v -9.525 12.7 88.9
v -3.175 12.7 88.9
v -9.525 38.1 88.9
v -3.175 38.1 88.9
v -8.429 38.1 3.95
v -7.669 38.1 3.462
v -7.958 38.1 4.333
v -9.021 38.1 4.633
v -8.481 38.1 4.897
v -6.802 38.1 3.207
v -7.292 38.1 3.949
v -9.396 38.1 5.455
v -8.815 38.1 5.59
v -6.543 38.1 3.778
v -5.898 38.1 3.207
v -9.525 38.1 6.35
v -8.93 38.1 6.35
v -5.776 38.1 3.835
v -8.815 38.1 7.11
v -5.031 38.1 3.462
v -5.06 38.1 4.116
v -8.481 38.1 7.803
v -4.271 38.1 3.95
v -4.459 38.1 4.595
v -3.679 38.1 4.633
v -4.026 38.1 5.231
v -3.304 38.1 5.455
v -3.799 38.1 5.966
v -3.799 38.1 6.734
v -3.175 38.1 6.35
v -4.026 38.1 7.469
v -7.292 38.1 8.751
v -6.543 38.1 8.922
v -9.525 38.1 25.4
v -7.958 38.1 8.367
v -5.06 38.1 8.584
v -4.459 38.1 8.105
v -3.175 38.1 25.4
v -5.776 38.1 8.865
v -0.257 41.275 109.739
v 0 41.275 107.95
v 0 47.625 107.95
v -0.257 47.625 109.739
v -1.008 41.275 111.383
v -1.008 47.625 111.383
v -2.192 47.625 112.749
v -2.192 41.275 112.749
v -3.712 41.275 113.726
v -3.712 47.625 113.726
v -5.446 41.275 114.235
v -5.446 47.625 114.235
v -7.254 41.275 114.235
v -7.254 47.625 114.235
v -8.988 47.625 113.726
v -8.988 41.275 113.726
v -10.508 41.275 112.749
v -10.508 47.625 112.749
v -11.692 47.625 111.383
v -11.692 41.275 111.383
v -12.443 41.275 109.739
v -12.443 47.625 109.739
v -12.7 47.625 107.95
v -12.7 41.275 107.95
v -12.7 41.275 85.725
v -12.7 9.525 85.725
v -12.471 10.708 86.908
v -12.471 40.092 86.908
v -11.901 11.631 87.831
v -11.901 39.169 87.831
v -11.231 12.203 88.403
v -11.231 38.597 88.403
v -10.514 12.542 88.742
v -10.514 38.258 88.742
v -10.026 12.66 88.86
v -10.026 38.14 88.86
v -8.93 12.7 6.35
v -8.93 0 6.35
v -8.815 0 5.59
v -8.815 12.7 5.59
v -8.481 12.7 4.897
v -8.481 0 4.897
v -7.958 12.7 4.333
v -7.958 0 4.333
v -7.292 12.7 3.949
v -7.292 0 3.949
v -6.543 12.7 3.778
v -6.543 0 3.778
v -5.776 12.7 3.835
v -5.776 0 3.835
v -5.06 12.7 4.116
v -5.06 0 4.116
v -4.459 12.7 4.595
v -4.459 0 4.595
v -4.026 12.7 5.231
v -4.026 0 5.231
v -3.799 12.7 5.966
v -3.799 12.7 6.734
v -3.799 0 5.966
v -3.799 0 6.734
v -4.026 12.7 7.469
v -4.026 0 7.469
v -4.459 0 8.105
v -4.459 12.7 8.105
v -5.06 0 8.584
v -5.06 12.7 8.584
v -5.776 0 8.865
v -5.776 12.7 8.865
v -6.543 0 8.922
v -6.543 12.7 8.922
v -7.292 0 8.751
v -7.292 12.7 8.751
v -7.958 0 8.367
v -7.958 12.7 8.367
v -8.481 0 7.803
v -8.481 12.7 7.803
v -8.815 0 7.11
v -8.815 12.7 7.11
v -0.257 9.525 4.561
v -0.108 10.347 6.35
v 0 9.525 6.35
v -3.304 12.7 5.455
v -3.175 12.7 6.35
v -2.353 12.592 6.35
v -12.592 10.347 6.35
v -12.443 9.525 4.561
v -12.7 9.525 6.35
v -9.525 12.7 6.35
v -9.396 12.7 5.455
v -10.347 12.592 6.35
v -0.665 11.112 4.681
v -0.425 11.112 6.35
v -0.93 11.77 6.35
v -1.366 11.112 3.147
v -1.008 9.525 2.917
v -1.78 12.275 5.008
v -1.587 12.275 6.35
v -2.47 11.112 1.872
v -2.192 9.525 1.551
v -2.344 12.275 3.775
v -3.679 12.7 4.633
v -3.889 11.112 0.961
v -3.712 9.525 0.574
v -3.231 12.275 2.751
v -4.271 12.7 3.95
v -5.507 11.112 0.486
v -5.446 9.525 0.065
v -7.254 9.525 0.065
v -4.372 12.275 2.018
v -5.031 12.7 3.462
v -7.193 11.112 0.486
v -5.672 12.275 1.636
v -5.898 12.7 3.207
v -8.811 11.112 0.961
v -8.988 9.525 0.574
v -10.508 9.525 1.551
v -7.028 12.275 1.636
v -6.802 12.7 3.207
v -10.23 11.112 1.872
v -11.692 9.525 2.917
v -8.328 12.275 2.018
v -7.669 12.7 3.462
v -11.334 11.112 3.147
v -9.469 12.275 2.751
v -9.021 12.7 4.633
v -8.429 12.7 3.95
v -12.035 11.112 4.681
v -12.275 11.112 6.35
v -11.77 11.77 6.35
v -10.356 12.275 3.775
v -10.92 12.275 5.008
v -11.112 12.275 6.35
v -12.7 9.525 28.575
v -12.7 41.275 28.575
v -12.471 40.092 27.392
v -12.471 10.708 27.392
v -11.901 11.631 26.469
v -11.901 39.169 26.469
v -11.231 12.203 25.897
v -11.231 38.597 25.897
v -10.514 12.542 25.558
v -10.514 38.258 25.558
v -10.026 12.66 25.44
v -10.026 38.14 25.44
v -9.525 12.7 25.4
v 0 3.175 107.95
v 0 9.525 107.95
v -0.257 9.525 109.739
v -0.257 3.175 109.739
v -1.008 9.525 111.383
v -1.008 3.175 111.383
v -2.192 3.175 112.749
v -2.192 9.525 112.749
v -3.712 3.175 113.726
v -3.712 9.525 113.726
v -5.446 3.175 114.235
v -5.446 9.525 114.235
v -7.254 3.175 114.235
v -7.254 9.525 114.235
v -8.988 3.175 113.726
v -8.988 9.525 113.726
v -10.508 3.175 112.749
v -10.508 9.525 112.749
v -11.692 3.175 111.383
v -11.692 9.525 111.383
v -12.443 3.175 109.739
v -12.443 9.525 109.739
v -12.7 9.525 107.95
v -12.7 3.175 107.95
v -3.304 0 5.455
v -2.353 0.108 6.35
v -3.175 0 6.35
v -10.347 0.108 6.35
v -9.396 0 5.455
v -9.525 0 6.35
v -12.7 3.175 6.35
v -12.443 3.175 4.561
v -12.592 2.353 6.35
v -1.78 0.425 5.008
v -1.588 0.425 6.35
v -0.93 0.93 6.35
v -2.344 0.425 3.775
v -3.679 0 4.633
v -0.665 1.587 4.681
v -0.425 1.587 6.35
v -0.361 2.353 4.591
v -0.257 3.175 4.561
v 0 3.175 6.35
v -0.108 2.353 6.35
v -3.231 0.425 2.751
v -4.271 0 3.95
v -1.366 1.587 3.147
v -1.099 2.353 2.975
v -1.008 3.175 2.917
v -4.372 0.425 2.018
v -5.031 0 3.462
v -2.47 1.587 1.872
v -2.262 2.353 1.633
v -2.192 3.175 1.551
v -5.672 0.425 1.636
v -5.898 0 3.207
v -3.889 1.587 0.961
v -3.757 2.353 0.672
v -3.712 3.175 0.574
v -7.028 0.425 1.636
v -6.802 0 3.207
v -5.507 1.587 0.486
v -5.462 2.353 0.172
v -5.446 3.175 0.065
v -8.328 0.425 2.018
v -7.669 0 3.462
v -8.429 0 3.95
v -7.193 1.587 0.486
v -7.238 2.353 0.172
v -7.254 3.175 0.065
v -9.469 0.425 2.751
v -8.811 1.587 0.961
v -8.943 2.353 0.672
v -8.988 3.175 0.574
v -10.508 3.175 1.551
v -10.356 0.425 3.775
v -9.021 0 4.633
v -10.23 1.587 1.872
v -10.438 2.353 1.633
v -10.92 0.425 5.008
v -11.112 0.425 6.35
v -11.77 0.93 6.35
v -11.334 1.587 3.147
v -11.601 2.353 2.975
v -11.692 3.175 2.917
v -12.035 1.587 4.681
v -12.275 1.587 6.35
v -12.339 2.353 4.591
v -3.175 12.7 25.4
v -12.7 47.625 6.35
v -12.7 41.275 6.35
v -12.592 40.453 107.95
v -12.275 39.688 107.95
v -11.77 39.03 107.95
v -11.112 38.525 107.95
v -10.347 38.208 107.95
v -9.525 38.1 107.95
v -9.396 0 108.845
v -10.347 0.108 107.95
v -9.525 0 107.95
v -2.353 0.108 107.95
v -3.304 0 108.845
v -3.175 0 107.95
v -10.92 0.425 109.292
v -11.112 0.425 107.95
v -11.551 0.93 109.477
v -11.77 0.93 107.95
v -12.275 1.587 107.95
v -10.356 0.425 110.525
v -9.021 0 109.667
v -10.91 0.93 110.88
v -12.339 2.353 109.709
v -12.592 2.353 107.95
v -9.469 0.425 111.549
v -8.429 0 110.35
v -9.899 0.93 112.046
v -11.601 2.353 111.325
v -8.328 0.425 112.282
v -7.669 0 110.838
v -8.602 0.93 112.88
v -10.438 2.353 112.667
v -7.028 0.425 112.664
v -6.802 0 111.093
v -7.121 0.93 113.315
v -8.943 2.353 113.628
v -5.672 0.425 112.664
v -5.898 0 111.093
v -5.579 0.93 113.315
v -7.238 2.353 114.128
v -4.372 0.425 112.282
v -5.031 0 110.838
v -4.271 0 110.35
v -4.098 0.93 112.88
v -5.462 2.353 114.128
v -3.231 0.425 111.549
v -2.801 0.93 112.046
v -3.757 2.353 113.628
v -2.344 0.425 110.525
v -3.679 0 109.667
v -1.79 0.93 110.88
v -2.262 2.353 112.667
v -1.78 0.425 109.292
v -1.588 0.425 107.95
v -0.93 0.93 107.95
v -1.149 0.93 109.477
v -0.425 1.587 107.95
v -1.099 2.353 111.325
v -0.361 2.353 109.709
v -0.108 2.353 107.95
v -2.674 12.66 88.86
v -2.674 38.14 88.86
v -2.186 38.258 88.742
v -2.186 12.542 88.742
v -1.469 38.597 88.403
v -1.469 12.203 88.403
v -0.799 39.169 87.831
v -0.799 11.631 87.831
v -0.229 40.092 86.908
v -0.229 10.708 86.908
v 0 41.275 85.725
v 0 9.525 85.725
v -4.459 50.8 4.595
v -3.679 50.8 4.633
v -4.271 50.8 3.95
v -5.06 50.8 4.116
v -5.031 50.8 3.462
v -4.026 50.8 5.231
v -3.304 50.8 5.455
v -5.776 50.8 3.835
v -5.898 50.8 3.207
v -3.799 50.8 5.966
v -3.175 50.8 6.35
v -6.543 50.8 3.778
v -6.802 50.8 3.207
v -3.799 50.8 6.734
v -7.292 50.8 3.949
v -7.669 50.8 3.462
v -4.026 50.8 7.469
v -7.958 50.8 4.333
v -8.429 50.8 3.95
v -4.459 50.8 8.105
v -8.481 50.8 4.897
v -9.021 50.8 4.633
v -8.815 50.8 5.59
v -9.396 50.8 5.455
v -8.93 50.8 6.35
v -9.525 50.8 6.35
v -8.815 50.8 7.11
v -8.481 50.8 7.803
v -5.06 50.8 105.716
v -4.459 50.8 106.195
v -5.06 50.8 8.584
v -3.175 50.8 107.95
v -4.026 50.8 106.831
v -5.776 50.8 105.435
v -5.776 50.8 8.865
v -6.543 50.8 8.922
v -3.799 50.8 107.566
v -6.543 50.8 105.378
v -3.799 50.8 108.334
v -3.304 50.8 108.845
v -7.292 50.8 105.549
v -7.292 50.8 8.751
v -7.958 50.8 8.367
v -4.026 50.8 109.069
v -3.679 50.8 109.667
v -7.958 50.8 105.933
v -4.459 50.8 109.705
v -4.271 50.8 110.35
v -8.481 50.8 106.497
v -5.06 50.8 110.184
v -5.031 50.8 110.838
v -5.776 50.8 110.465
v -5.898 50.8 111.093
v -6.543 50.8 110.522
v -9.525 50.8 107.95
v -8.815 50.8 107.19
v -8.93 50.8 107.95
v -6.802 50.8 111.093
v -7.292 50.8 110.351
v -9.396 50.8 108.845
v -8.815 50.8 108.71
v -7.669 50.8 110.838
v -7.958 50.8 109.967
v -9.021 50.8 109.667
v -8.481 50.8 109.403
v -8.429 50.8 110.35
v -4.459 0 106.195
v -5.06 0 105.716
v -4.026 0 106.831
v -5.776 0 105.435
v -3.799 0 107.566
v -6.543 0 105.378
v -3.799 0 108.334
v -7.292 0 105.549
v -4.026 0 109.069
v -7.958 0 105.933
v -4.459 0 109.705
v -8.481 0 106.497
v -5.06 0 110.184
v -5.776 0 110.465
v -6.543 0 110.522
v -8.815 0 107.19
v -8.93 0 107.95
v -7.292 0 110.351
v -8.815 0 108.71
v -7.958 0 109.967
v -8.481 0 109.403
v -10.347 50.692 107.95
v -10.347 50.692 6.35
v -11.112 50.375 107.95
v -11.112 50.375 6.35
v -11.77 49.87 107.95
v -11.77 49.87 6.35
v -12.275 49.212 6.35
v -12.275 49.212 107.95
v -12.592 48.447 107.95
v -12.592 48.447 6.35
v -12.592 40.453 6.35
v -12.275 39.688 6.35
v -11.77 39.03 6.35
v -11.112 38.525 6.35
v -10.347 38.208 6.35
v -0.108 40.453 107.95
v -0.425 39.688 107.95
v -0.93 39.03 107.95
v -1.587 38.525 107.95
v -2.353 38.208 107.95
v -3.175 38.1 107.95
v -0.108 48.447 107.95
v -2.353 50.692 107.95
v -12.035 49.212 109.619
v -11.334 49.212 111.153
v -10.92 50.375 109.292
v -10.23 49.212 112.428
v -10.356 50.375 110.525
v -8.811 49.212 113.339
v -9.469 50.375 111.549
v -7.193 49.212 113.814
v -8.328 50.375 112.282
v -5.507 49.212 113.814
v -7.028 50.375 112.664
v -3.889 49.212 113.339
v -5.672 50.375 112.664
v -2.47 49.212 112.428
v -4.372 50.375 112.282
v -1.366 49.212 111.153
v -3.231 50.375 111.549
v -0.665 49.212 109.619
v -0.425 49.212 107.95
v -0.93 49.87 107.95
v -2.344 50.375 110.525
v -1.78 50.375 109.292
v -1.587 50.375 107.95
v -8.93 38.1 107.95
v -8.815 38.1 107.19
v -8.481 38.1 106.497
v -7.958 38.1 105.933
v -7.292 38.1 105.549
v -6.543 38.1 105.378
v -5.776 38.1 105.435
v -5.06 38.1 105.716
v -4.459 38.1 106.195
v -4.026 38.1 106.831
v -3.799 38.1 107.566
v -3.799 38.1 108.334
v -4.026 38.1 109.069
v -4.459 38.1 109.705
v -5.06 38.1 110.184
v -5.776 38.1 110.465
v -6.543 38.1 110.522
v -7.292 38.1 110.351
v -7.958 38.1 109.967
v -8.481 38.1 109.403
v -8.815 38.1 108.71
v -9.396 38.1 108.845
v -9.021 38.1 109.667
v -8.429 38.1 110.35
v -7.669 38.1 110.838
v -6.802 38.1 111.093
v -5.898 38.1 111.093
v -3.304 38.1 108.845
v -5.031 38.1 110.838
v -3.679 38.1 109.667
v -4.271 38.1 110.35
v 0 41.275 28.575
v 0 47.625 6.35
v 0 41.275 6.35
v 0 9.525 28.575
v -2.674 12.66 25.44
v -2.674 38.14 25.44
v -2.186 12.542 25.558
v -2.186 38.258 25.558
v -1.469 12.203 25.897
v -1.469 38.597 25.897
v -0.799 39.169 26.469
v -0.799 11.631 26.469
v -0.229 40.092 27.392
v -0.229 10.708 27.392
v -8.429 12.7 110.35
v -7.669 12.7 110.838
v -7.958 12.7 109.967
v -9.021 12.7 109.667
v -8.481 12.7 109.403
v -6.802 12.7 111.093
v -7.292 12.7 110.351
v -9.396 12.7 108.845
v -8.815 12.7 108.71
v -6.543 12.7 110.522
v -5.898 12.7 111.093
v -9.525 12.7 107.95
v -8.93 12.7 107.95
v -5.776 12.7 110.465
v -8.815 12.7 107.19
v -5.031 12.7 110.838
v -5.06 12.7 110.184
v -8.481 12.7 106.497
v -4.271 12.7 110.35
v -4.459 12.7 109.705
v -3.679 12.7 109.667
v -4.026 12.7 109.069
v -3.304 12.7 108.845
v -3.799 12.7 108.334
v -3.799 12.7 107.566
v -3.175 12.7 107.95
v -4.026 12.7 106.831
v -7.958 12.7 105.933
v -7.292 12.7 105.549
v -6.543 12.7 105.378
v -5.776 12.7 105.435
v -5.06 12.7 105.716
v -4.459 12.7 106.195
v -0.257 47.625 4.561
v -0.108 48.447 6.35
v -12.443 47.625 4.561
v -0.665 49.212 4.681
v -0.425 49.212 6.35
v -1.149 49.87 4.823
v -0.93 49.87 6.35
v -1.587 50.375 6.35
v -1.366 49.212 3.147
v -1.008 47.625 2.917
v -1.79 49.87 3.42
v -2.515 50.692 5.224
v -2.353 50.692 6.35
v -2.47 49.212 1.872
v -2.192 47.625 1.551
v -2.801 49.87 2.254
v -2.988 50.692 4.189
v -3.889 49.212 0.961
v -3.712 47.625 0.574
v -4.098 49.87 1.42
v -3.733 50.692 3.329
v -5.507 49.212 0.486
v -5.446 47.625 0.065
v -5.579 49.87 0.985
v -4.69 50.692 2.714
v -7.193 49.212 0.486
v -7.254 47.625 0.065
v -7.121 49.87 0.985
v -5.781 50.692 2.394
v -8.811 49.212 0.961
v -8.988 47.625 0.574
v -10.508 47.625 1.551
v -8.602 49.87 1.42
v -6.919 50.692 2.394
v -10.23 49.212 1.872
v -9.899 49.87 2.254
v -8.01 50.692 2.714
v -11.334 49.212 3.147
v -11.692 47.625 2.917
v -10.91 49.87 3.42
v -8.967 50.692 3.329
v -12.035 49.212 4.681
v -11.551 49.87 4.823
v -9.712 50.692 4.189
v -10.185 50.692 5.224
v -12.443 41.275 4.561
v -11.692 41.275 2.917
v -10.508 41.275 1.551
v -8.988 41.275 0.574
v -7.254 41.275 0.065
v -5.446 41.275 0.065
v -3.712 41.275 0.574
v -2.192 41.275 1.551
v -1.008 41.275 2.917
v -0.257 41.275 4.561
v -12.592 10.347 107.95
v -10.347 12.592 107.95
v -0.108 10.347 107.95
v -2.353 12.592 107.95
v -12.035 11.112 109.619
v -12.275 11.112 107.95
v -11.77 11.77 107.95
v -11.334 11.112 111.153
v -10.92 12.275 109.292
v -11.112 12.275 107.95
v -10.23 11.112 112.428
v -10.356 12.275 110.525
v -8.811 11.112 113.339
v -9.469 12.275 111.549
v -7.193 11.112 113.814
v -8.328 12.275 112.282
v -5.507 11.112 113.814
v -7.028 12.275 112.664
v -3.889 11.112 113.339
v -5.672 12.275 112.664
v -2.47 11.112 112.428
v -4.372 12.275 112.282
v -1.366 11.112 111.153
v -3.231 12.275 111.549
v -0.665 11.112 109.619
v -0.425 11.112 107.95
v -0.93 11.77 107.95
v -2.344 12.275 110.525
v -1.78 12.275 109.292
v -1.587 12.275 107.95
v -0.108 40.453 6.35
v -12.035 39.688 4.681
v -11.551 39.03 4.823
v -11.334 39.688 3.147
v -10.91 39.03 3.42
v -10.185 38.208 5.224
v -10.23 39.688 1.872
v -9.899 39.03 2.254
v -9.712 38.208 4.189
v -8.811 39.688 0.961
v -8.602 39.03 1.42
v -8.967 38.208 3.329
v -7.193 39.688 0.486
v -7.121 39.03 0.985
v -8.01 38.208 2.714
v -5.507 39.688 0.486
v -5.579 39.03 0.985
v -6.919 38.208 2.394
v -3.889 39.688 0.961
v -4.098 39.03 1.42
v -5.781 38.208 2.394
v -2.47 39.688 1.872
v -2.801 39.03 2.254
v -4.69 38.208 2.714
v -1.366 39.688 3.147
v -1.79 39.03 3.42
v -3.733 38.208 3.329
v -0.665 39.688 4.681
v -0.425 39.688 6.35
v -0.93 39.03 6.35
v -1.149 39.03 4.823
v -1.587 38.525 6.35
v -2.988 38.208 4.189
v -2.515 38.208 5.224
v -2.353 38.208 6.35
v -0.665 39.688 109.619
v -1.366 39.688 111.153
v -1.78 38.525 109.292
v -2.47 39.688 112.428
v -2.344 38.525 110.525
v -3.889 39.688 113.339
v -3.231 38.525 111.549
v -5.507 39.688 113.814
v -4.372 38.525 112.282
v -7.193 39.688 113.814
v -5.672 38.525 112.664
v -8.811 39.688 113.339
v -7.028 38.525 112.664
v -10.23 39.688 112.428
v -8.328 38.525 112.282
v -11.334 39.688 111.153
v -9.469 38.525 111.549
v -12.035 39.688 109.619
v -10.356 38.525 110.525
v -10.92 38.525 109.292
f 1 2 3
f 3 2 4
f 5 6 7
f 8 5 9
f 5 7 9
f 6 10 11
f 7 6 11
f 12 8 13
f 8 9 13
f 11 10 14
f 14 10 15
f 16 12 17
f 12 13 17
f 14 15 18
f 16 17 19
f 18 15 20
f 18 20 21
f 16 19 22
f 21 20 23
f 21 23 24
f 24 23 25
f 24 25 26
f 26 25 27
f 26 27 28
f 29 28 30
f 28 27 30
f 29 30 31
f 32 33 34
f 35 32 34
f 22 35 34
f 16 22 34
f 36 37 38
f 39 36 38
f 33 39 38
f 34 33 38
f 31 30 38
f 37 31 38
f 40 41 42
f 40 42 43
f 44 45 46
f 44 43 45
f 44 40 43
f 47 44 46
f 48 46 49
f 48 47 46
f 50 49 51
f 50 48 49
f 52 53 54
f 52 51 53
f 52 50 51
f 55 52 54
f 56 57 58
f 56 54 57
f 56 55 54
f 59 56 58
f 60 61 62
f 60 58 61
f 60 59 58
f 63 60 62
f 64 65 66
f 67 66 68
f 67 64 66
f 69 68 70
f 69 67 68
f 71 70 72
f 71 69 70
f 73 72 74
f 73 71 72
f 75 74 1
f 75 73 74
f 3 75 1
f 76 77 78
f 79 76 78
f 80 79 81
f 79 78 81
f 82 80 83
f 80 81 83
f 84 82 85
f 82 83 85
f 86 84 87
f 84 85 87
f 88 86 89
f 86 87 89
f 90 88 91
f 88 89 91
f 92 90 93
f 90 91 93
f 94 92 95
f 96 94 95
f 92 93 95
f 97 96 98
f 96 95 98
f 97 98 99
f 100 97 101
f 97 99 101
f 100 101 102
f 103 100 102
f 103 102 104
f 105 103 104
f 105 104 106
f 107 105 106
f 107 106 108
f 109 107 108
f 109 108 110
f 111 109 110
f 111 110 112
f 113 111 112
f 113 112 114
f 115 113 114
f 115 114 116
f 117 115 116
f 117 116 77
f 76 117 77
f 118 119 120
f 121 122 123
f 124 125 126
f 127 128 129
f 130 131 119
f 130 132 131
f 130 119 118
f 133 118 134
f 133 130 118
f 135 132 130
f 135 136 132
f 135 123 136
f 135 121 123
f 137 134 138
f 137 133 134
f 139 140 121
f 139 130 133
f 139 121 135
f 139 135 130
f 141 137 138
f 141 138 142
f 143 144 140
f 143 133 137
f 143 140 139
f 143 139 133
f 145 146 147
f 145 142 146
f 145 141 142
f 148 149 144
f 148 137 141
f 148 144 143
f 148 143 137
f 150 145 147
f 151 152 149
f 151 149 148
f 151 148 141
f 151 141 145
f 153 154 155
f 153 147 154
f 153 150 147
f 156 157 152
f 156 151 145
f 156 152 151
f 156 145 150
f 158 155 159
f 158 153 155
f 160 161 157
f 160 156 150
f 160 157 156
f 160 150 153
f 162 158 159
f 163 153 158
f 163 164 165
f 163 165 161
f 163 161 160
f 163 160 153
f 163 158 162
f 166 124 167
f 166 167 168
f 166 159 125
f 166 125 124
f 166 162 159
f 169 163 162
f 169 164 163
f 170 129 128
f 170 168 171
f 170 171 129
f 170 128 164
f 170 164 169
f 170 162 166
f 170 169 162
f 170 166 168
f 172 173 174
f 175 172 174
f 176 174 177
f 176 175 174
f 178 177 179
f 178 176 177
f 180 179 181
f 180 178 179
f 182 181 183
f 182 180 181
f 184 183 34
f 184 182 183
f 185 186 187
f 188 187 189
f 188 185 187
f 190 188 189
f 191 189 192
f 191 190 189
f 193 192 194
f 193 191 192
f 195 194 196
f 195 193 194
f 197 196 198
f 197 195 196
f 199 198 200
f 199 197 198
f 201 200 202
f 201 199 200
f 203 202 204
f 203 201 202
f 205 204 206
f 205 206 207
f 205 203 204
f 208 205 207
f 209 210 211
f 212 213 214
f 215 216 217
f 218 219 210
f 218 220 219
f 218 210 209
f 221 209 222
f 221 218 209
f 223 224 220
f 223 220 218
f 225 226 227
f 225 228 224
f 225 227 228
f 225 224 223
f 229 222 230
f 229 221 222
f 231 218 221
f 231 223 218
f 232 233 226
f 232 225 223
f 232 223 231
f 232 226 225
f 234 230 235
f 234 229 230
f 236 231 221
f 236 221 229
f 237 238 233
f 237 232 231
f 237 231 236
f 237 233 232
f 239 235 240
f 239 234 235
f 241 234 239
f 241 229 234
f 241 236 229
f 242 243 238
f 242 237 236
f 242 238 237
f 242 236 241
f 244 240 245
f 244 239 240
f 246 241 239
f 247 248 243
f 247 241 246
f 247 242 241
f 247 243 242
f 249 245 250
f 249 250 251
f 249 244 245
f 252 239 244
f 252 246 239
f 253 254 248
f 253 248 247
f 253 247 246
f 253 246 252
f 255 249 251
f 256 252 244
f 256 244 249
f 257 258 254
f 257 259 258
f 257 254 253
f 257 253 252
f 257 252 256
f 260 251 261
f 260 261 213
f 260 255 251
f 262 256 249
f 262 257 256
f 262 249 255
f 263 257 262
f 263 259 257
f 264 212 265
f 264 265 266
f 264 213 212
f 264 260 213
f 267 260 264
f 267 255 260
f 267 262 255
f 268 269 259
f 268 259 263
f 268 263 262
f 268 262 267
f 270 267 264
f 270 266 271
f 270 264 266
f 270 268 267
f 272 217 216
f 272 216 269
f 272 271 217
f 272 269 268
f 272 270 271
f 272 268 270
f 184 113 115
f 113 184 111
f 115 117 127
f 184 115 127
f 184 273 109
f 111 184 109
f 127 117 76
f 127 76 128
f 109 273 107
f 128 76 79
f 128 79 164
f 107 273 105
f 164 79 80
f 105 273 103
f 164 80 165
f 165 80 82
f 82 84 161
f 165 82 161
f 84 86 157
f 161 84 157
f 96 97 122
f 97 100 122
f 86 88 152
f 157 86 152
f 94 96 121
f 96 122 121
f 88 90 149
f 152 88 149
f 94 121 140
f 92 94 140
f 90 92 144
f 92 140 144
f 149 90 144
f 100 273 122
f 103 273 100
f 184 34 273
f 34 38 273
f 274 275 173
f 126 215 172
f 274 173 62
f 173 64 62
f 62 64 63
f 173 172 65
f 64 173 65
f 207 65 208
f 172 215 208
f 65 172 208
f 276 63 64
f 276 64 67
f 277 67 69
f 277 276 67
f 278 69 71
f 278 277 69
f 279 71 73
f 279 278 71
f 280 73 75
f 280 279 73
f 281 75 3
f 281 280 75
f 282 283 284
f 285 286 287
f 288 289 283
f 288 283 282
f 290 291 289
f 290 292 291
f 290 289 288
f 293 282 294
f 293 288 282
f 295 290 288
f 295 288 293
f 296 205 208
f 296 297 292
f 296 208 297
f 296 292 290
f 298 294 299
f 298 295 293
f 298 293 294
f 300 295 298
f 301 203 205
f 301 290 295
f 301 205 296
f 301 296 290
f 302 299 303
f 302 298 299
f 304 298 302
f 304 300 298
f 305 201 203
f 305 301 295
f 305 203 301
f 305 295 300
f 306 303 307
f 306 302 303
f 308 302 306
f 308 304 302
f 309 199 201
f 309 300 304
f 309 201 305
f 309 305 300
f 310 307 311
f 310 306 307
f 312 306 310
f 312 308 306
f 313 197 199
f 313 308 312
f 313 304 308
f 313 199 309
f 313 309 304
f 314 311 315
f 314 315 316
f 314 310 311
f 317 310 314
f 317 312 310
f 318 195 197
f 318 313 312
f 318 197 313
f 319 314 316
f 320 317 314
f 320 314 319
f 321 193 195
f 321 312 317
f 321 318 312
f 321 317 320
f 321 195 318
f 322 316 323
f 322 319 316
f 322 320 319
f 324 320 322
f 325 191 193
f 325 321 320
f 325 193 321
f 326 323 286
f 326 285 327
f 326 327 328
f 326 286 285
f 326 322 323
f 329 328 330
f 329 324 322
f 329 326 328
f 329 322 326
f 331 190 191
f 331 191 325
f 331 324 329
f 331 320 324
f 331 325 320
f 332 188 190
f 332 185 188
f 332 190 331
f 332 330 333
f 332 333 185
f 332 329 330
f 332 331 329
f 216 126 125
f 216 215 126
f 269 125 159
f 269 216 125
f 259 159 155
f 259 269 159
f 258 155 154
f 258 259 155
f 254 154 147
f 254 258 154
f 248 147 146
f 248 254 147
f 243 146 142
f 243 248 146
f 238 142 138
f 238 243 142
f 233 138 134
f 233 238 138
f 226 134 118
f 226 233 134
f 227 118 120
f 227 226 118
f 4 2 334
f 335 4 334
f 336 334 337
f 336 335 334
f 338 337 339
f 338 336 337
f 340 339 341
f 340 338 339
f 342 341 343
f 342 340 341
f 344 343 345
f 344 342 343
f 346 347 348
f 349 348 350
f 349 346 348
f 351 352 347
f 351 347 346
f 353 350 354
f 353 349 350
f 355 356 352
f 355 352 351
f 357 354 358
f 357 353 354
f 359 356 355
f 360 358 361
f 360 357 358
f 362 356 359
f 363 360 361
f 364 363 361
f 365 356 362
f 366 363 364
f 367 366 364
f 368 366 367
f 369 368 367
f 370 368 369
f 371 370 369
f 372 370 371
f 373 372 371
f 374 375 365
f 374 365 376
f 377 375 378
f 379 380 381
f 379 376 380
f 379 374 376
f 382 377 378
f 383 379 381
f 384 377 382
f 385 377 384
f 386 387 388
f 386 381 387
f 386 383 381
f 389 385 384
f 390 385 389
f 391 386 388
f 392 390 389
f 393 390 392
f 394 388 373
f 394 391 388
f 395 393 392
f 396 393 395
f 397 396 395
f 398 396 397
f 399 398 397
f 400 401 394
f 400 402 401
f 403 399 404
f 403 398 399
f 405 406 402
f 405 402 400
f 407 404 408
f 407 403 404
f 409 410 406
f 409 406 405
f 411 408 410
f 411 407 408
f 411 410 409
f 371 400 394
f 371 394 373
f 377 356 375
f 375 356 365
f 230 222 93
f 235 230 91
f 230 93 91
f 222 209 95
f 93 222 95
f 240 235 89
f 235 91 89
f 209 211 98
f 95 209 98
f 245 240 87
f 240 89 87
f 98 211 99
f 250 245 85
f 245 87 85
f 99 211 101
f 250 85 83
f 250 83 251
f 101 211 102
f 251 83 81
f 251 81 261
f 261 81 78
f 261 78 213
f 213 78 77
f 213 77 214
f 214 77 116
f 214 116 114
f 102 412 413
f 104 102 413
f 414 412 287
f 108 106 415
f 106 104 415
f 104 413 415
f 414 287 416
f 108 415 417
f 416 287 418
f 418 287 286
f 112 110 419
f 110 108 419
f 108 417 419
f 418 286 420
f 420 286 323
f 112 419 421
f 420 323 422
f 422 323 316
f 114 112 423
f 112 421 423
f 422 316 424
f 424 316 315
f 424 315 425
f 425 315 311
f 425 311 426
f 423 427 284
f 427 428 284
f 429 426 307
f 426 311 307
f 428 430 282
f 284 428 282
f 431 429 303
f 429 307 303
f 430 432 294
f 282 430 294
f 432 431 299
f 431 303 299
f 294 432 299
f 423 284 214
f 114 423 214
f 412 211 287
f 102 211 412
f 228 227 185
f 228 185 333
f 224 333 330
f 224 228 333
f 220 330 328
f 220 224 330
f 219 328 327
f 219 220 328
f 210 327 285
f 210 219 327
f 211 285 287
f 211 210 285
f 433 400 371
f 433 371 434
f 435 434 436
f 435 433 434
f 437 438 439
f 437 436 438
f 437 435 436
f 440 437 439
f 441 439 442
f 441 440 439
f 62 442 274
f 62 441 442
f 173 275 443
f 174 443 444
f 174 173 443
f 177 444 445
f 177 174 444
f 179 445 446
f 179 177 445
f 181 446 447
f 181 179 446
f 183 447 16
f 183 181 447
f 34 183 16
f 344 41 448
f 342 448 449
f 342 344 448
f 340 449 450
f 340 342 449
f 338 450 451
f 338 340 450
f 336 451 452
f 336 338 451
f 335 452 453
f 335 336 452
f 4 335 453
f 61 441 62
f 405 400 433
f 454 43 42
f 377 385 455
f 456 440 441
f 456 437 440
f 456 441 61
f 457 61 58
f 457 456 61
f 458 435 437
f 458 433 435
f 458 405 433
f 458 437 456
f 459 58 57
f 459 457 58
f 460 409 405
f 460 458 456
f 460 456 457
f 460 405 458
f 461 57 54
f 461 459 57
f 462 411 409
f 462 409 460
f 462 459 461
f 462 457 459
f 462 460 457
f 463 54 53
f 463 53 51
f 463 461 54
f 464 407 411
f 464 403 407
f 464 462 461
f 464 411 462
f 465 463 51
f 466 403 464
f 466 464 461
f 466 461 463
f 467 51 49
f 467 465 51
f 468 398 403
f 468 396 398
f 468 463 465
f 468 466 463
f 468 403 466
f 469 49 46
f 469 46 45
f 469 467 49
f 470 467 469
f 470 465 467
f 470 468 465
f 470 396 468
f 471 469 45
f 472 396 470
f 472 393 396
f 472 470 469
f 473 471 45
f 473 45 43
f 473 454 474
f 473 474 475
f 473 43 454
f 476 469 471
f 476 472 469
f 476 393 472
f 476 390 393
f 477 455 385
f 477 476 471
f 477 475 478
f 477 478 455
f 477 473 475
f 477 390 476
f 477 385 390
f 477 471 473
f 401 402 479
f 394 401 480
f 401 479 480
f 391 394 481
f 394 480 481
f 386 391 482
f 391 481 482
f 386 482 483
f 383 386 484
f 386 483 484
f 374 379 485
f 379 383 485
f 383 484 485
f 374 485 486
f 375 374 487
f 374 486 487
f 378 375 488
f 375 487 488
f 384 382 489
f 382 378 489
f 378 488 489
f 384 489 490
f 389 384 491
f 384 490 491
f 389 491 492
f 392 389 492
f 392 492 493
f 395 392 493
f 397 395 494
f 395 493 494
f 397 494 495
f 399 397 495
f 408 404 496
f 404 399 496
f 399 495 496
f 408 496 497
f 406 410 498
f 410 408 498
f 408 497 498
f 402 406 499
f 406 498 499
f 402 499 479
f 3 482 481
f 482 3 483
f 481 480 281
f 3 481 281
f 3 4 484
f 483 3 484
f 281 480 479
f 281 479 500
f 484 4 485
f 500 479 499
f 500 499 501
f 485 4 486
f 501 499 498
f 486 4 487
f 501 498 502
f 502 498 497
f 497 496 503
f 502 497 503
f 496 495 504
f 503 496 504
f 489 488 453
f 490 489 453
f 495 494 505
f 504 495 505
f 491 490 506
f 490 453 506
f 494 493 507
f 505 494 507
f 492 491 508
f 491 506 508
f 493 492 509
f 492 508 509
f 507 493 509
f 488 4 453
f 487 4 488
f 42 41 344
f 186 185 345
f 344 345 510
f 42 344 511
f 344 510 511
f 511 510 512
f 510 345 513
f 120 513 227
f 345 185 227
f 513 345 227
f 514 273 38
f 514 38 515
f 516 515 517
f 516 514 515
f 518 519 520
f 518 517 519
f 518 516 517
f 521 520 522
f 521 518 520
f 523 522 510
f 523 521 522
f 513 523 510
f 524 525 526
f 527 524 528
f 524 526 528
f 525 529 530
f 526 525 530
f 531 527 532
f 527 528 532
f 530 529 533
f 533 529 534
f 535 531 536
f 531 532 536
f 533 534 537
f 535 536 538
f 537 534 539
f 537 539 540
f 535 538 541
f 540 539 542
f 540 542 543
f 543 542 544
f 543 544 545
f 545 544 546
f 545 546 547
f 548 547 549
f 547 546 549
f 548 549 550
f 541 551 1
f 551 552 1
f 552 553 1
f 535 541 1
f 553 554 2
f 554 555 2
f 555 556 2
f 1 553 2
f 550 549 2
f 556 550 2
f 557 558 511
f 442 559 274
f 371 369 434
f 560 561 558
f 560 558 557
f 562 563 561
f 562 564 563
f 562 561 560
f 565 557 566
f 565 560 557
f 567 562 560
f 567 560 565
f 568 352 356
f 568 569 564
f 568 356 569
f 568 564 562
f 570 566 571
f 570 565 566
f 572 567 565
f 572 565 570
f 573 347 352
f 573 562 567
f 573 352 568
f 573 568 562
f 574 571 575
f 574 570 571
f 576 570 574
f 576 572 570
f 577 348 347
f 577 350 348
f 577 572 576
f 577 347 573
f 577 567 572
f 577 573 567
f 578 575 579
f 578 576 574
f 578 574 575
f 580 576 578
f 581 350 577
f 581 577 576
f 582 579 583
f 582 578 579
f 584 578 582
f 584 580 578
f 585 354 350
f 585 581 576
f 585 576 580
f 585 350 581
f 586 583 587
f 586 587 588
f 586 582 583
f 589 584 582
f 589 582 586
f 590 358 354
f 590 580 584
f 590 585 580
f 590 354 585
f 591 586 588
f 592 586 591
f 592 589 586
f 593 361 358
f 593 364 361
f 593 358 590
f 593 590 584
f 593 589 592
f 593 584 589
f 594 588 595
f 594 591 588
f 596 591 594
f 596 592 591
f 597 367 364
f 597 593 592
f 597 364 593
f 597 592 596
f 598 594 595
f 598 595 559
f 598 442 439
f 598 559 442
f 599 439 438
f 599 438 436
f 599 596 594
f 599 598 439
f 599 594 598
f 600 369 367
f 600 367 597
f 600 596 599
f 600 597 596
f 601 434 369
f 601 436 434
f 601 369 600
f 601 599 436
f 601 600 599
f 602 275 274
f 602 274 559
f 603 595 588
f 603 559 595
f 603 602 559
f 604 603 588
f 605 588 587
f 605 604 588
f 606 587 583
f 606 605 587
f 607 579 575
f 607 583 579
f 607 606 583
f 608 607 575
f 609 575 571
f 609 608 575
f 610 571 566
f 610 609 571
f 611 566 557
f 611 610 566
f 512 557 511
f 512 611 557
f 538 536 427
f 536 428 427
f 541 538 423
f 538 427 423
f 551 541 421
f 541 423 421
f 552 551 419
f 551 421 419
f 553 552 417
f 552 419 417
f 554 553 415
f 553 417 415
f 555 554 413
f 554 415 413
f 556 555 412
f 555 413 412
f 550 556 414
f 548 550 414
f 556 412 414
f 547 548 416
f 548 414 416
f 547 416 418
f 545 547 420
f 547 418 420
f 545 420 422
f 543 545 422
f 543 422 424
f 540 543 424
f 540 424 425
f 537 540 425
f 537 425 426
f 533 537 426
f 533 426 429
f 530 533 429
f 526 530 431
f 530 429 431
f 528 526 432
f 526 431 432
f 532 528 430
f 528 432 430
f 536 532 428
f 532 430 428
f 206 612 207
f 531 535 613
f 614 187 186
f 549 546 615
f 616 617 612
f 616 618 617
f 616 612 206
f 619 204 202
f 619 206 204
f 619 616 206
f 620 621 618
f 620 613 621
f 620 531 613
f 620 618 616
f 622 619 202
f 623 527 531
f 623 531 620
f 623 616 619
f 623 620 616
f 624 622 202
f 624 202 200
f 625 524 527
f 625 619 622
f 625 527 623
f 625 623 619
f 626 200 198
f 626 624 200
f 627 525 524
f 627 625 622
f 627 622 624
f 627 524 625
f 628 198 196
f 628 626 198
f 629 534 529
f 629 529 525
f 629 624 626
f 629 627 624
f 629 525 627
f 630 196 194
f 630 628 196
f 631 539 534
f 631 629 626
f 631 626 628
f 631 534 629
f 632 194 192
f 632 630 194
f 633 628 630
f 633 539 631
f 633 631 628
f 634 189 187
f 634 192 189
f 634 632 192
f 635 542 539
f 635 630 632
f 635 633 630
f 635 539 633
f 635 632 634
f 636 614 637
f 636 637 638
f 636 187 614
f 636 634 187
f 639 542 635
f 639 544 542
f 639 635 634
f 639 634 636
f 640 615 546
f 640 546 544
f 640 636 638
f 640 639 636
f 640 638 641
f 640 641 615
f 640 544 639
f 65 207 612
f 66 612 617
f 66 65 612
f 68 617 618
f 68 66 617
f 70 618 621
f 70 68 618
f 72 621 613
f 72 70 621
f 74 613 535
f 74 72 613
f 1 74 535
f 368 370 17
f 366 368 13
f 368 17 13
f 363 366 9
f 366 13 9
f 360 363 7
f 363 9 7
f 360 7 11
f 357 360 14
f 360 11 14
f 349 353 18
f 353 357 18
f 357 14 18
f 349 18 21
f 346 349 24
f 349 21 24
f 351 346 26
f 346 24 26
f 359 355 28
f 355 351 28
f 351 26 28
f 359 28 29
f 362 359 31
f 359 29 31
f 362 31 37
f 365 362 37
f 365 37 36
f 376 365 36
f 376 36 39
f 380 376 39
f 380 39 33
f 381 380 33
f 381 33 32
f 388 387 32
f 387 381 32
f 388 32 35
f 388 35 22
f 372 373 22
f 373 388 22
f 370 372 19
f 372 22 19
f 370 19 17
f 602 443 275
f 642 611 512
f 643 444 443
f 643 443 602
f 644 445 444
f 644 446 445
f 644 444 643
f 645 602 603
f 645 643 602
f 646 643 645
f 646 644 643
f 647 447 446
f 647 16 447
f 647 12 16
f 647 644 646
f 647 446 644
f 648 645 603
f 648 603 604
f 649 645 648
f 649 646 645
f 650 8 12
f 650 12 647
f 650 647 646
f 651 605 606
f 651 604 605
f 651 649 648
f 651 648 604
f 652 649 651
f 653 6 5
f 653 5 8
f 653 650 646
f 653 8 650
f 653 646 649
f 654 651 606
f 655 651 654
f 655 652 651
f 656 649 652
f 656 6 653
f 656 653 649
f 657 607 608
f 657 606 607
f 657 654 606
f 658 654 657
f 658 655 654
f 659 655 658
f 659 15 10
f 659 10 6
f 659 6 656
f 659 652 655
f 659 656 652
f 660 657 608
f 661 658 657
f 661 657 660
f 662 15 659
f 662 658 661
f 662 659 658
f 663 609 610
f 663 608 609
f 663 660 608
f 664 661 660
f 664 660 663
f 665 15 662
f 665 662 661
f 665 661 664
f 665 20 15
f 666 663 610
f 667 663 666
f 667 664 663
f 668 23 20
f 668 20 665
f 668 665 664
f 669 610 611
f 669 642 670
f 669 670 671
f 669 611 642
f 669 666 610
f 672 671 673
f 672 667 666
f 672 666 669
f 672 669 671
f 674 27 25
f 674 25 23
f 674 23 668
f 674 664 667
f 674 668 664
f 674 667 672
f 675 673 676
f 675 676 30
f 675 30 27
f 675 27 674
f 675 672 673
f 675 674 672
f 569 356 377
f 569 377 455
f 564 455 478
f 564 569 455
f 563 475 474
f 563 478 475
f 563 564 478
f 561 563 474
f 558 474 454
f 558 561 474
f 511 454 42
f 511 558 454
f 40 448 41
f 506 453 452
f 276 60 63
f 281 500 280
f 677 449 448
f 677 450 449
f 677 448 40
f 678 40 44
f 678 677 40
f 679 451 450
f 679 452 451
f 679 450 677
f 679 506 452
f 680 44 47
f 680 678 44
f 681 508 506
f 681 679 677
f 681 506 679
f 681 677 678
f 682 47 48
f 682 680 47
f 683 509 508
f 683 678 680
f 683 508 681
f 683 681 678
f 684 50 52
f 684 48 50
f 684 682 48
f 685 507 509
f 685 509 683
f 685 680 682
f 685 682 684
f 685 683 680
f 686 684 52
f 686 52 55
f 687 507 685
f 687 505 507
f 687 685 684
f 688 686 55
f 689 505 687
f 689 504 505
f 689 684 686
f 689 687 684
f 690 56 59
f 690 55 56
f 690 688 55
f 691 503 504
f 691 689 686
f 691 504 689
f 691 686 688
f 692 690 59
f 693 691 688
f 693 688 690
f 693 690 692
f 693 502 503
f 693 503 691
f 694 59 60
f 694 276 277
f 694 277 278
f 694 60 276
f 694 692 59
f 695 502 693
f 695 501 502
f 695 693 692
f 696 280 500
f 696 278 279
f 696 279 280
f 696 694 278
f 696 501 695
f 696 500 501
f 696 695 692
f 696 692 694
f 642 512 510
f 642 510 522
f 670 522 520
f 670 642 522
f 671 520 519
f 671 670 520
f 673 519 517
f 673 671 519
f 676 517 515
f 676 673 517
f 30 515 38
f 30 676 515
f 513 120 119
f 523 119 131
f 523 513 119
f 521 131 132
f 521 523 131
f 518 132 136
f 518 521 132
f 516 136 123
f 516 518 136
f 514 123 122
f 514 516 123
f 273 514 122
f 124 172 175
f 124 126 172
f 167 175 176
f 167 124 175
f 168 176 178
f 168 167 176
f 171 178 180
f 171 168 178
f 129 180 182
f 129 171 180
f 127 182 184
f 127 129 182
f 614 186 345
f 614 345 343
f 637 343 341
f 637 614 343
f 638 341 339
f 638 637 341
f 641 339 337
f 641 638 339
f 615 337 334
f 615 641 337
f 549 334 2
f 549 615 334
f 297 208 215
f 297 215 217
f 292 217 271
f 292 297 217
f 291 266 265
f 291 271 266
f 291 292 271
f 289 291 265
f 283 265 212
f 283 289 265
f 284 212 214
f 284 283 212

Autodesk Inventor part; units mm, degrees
ref_plane "YZ Plane" through (0, 0, 0) normal (1, 0, 0) x (0, 1, 0)
ref_plane "XZ Plane" through (0, 0, 0) normal (0, 1, 0) x (-1, 0, 0)
ref_plane "XY Plane" through (0, 0, 0) normal (0, 0, 1) x (1, 0, 0)
sketch "Sketch1" plane through (0, 0, 0) normal (0, 1, 0) x (-1, 0, 0)
  line L0 (0, 0) -> (12.7, 0)
  line L1 (12.7, 0) -> (12.7, 114.3)
  line L2 (12.7, 114.3) -> (0, 114.3)
  line L3 (0, 114.3) -> (0, 0)
  circle A0 centre (6.35, 6.35) radius 2.5797
  circle A1 centre (6.35, 107.95) radius 2.5797
  circle A2 centre (6.35, 6.35) radius 6.35
  circle A3 centre (6.35, 107.95) radius 6.35
  point P0 (0, 107.95)
  point P1 (0, 6.35)
  point P2 (12.7, 6.35)
  point P3 (12.7, 107.95)
  dimension "d0" = 12.7
  dimension "d2" = 6.35
  dimension "d3" = 6.35
  dimension "d4" = 5.1594
  dimension "d5" = 6.35
  dimension "d6" = 5.1594
  dimension "d7" = 6.35
  dimension "d51" = 101.6
  dimension "d52" = 12.7
  dimension "d53" = 12.7
extrude "Extrusion1" add sketch "Sketch1" along normal blind 50.8 contours A2 | L3 A3 L1 A2 | A3
sketch "Sketch5" plane through (0, 0, 107.95) normal (1, 0, 0) x (0, 0, -1)
  line L0 (107.95, 50.8) -> (101.6, 50.8) projected
  line L1 (0, 0) -> (107.95, 0)
  line L2 (107.95, 0) -> (107.95, 50.8)
  line L3 (107.95, 50.8) -> (0, 50.8)
  line L4 (0, 50.8) -> (0, 0)
  line L5 (107.95, 0) -> (107.95, 50.8) projected
  line L6 (107.95, 38.1) -> (82.55, 38.1)
  line L7 (82.55, 38.1) -> (82.55, 12.7)
  line L8 (82.55, 12.7) -> (107.95, 12.7)
  line L9 (107.95, 12.7) -> (107.95, 38.1)
  line L10 (101.6, 50.8) -> (0, 50.8) projected
  line L11 (-6.35, 0) -> (-6.35, 50.8) projected
  line L12 (0, 50.8) -> (-6.35, 50.8)
  line L13 (-6.35, 50.8) -> (-6.35, 0)
  line L14 (-6.35, 0) -> (0, 0)
  line L15 (0, 0) -> (0, 50.8)
  line L16 (-6.35, 0) -> (-6.35, 50.8) projected
  line L17 (-6.35, 12.7) -> (19.05, 12.7)
  line L18 (19.05, 12.7) -> (19.05, 38.1)
  line L19 (19.05, 38.1) -> (-6.35, 38.1)
  line L20 (-6.35, 38.1) -> (-6.35, 12.7)
  point P0 (95.25, 38.1)
  point P1 (107.95, 38.1)
  dimension "d47" = 25.4
  dimension "d48" = 25.4
  dimension "d49" = 12.7
extrude "Extrusion5" cut sketch "Sketch5" against normal through all contours L2 L8 L7 L6 | L19 L18 L17 L4 | L4 L17 L11 L19
fillet "Fillet3" radius 3.175 24 edges at (-12.7, 38.1, 15.875) (0, 38.1, 15.875) (-6.35, 38.1, 0) (-6.35, 12.7, 0) (-12.7, 12.7, 15.875) (0, 12.7, 15.875) (0, 25.4, 25.4) (-12.7, 25.4, 25.4) (-12.7, 0, 57.15) (-6.35, 0, 114.3) (0, 0, 57.15) (-6.35, 0, 0) (-6.35, 50.8, 114.3) (0, 50.8, 57.15) (-6.35, 50.8, 0) (-12.7, 50.8, 57.15) (0, 25.4, 88.9) (-12.7, 25.4, 88.9) (-6.35, 12.7, 114.3) (-12.7, 12.7, 98.425) (0, 12.7, 98.425) (0, 38.1, 98.425) (-12.7, 38.1, 98.425) (-6.35, 38.1, 114.3)
properties part number "swing pusher"
